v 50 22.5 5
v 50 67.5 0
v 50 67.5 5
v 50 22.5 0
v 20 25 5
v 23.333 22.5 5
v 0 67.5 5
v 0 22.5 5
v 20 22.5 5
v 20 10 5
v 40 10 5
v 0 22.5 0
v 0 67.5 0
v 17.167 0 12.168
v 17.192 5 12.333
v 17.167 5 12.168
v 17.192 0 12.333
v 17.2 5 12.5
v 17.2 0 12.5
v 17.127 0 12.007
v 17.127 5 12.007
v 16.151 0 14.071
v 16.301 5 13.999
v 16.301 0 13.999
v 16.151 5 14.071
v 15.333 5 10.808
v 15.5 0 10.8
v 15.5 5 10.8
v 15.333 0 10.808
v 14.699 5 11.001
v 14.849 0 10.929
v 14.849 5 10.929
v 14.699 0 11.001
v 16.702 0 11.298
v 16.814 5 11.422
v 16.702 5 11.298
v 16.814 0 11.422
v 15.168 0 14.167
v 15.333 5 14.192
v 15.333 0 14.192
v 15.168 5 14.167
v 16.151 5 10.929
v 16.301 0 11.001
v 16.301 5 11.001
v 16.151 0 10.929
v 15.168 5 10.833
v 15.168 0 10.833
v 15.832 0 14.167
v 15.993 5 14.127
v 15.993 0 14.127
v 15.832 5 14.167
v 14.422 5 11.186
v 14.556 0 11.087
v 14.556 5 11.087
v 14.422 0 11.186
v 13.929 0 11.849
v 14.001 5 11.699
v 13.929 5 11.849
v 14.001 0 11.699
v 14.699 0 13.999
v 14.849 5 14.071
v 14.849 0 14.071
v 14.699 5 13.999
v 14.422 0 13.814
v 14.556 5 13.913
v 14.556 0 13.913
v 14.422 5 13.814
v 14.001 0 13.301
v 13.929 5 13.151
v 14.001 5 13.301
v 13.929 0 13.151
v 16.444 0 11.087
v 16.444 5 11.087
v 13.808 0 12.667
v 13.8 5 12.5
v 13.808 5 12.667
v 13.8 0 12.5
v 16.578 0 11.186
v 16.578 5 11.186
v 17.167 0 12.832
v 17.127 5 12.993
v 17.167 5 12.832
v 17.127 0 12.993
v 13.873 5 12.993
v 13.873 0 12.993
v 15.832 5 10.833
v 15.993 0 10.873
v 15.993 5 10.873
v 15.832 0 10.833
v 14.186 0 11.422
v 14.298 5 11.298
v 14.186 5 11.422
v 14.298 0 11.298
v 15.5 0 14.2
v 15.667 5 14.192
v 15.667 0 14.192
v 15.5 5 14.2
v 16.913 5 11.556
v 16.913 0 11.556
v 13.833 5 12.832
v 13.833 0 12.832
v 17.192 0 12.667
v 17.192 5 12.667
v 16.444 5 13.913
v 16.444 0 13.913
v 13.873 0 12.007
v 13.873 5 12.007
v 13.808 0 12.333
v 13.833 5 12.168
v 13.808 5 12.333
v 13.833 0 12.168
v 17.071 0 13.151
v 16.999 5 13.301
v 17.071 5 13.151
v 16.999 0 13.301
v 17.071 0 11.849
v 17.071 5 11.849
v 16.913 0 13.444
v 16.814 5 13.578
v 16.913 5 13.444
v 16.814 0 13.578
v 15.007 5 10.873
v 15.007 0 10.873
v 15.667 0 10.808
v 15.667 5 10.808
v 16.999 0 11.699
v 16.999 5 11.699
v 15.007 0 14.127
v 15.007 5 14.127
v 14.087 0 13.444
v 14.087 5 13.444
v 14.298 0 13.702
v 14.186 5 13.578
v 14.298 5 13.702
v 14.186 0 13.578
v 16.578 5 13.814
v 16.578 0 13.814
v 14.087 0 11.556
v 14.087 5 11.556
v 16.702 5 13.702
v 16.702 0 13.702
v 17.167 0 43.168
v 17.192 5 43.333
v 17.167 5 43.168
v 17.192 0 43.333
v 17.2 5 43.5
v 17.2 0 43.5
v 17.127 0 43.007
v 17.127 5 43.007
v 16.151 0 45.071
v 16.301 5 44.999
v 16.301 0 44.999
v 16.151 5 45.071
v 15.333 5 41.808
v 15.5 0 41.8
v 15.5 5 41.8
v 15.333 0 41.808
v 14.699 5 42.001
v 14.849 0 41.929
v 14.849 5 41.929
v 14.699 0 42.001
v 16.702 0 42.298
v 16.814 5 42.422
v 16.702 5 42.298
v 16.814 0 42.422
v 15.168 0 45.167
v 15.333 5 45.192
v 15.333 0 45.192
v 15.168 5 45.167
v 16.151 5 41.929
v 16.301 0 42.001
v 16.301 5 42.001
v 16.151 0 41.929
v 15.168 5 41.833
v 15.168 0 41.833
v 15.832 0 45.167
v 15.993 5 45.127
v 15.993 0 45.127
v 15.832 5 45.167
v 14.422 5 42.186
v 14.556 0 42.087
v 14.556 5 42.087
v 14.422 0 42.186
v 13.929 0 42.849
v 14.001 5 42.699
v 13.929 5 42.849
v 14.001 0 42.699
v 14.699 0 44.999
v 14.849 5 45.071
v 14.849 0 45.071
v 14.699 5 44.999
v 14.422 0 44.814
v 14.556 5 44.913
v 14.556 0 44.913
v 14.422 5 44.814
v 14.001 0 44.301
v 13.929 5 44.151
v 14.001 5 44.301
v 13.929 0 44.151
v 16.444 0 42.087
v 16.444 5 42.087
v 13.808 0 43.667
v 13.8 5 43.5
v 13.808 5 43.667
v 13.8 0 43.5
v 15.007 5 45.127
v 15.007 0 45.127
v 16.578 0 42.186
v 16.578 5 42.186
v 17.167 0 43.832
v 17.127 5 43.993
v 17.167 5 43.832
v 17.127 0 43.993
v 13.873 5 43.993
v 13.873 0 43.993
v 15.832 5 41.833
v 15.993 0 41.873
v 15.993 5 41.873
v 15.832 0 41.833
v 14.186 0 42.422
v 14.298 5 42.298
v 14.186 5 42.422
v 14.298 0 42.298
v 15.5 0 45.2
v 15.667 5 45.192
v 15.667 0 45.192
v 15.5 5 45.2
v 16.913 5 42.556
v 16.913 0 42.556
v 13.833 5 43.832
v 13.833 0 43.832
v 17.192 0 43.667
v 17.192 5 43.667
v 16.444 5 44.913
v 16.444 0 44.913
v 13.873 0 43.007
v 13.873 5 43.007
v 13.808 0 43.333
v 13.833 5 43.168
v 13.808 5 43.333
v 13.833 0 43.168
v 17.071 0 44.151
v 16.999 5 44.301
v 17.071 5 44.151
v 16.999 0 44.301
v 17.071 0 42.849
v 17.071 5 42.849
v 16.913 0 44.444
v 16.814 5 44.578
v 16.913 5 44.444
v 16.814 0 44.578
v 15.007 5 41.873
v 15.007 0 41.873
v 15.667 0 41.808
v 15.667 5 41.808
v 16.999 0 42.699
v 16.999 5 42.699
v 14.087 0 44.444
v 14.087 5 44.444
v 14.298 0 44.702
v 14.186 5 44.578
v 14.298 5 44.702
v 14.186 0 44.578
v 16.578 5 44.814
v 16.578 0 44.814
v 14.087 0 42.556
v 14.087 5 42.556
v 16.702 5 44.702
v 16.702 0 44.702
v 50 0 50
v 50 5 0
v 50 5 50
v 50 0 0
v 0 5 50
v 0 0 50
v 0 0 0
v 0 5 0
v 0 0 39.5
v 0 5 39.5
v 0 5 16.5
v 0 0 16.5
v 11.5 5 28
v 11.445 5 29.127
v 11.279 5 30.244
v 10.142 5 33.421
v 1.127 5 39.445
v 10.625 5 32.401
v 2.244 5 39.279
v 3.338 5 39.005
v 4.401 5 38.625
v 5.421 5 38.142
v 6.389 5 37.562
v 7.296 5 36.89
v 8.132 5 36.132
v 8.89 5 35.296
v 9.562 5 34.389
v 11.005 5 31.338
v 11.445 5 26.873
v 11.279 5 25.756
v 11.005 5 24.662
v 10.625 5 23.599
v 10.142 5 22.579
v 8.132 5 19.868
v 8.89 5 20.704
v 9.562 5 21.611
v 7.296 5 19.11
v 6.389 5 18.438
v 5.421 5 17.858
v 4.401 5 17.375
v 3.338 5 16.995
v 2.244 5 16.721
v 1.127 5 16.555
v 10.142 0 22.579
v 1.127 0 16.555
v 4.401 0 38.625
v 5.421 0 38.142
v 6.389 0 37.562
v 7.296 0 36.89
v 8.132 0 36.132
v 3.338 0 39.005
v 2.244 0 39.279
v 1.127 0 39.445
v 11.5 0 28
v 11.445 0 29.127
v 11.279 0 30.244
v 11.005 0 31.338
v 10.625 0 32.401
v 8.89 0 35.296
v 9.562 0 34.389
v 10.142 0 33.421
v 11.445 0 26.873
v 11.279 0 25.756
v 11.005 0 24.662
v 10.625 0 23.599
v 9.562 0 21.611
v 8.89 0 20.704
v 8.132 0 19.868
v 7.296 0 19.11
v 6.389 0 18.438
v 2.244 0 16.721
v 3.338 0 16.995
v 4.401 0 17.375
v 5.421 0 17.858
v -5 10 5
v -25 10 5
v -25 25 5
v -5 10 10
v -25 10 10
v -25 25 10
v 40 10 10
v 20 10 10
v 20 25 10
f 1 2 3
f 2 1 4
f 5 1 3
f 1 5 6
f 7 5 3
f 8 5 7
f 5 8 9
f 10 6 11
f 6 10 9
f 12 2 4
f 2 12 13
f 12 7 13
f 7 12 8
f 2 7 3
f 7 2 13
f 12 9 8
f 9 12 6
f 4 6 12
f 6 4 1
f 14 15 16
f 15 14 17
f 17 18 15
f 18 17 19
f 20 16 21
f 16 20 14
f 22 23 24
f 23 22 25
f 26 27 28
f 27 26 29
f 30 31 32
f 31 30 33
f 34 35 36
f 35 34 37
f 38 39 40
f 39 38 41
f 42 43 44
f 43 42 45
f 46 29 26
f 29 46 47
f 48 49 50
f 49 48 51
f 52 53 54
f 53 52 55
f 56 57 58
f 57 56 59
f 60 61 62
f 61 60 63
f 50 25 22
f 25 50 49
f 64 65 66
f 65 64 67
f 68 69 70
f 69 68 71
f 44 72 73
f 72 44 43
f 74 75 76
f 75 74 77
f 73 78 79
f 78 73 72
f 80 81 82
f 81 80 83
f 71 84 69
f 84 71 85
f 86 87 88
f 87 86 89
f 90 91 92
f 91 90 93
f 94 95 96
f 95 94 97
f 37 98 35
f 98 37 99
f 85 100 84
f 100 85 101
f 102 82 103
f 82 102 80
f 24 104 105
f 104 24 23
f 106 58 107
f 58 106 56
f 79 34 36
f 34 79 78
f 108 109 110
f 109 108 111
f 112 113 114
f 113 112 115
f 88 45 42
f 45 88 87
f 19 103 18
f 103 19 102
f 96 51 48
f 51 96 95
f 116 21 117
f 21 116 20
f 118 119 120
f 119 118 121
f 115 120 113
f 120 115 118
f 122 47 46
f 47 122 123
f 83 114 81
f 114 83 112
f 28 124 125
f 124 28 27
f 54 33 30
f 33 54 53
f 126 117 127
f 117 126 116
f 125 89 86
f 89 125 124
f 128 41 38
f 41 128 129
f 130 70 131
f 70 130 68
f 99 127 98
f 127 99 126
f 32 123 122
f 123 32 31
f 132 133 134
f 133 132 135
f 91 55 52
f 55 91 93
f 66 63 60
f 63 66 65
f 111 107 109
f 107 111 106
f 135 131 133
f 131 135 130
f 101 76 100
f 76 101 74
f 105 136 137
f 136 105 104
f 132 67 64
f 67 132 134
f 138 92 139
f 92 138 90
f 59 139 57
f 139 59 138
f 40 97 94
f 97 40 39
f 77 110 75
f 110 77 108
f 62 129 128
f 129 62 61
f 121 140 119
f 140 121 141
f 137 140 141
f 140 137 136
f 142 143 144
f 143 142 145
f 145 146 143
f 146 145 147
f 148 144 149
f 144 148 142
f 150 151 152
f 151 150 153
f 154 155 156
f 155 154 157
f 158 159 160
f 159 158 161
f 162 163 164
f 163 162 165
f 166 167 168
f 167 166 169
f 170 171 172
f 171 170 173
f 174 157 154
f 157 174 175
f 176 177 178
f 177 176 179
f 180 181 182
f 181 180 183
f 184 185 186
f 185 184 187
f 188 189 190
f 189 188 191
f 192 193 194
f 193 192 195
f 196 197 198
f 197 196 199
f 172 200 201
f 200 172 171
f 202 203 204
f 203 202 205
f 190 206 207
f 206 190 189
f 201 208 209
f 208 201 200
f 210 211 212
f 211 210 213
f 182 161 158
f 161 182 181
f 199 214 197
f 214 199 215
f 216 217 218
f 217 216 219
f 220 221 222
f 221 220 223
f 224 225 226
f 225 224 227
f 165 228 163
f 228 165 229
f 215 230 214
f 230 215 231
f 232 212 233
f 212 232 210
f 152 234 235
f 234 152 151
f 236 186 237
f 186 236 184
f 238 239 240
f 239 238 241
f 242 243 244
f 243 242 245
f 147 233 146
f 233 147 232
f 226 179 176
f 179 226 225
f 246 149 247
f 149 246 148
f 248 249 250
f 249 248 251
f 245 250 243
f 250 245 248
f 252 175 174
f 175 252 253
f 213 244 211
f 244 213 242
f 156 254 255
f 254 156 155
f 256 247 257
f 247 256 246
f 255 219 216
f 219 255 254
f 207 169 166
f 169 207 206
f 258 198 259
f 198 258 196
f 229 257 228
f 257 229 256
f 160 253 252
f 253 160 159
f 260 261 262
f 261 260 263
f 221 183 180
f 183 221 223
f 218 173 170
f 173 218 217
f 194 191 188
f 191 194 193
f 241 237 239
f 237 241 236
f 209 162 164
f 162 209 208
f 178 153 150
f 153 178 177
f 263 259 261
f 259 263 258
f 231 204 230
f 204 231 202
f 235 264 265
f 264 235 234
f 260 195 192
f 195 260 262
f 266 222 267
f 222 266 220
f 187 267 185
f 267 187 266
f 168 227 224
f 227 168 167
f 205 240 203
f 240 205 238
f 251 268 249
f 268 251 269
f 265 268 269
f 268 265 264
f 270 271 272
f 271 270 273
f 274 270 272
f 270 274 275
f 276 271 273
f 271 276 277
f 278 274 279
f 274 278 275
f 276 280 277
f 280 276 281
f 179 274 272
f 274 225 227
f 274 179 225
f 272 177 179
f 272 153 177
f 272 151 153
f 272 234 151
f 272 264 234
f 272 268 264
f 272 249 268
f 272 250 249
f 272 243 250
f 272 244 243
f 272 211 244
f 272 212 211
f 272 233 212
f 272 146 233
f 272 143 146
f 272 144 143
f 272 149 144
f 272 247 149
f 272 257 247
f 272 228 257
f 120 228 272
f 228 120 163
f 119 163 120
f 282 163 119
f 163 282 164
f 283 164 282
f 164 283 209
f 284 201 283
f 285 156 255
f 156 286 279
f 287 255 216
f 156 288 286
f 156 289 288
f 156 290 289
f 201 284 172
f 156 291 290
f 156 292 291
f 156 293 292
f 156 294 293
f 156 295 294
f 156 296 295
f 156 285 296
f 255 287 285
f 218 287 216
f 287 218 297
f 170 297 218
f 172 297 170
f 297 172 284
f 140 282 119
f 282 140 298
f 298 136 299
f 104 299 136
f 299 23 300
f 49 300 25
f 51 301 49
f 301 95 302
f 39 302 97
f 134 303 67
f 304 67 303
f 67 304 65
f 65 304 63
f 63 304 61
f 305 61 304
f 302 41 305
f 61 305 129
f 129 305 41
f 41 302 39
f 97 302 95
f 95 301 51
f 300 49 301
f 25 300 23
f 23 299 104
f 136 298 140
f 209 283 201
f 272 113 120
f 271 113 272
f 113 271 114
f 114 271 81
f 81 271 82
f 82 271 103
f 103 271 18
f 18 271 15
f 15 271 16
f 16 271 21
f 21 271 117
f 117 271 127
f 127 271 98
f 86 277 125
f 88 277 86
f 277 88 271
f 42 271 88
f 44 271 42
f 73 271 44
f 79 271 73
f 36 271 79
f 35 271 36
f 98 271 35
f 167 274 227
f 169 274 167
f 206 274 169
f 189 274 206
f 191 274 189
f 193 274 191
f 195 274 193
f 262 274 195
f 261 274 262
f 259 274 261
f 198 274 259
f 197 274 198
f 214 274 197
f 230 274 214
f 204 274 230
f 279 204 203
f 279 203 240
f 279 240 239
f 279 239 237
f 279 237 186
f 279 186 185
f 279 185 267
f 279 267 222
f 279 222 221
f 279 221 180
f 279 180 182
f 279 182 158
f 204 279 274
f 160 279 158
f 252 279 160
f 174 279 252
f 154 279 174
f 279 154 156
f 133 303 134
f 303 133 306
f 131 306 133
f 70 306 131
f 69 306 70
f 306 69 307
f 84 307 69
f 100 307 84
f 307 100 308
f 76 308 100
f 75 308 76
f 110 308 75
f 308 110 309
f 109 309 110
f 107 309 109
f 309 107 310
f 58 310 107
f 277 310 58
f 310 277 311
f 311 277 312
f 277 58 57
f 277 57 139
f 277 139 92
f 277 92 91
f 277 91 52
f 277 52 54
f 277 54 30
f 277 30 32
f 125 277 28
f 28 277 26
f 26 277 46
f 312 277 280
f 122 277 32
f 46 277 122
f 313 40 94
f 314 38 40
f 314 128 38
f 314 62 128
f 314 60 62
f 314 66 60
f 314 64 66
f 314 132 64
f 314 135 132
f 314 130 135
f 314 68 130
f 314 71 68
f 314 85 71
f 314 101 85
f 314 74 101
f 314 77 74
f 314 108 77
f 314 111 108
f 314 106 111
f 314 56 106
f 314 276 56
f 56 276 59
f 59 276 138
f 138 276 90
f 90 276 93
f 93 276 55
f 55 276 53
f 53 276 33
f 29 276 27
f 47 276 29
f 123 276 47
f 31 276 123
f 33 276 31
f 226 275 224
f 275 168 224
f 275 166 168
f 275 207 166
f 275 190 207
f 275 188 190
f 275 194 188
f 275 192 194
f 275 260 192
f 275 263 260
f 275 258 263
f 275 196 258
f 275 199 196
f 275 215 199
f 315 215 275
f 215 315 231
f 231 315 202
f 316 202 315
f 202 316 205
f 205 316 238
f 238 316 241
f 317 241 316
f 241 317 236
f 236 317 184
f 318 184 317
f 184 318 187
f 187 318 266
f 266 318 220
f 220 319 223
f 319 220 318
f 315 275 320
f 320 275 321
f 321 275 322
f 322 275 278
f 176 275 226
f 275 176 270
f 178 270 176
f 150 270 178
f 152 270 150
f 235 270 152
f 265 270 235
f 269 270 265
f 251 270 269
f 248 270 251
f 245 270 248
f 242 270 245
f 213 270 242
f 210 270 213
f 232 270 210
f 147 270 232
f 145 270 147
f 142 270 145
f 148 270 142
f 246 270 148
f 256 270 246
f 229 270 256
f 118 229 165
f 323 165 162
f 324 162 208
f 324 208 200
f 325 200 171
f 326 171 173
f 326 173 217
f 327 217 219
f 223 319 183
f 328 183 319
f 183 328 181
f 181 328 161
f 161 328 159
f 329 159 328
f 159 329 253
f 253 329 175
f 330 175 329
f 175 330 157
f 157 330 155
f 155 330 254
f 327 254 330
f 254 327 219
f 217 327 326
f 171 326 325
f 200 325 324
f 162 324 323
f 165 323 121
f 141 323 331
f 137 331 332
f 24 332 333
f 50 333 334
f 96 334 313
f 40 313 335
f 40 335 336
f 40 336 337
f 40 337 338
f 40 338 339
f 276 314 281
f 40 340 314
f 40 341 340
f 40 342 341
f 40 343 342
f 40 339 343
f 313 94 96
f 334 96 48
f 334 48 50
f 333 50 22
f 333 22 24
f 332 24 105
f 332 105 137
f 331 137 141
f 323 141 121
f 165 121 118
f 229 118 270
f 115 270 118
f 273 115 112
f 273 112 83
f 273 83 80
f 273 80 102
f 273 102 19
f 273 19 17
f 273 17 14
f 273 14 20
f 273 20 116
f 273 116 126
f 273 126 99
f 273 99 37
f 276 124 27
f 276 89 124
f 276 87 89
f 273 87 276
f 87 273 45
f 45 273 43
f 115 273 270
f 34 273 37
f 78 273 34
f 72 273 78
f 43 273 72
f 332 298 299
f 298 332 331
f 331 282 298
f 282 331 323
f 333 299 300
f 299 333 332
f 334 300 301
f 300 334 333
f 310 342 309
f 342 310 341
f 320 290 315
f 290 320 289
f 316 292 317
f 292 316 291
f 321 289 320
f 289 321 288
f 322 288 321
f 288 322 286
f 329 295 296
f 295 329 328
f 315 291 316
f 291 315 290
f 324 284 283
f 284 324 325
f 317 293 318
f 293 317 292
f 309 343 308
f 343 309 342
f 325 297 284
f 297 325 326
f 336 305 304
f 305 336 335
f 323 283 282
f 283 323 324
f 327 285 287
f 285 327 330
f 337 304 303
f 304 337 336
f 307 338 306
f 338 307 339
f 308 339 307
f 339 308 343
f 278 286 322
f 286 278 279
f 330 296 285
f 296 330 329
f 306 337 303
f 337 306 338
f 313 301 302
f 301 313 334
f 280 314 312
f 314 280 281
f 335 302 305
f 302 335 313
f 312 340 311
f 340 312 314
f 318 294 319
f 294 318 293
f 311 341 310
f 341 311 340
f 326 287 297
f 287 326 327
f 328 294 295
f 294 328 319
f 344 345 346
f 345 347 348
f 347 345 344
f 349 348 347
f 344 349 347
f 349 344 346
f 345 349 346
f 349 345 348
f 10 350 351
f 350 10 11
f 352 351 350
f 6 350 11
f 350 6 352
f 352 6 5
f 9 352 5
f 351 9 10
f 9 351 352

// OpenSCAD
// NEMA 17 Stepper Motor L-Bracket for Syringe Pump
// Corrected version based on measurement report analysis

// --- Dimensions ---
// Base Plate
base_x_min = -25;
base_x_max = 25;
base_y_min = 0;
base_y_max = 45;
base_z_height = 5;

// Base Plate Holes (M4)
m4_hole_dia = 4.5;
m4_hole_x1 = -17;
m4_hole_y1 = 30;
m4_hole_x2 = 17;
m4_hole_y2 = 30;

// Vertical Motor Plate
motor_plate_x_min = -25;
motor_plate_x_max = 25;
motor_plate_y_min = 0;
motor_plate_y_max = 5;
motor_plate_z_height = 50;

// Motor Boss Hole (Centering)
boss_hole_dia = 23;
boss_hole_x = 0;
boss_hole_z = 28;

// Motor Screw Holes (M3)
m3_hole_dia = 3.4;
m3_pattern_size = 31;

// Gussets
gusset_thickness = 5;
gusset_leg_y = 20;
gusset_leg_z = 20;
gusset_x_left_min = -25;
gusset_x_left_max = -20;
gusset_x_right_min = 20;
gusset_x_right_max = 25;

// Resolution
$fn = 64;

// --- Modeling ---

module gusset_shape() {
    // A right triangle in YZ plane
    // Corner at y=5, z=5. Legs are 20mm.
    // Vertices in YZ: (5,5), (25,5), (5,25)
    polygon(points = [
        [0, 5], 
        [gusset_leg_y, 5], 
        [0, gusset_leg_z]
    ]);
}

union() {
    // 1. Main Base Plate
    difference() {
        // Centered on X, Y=0 is the edge. 
        // To make X centered on origin: translate by (base_x_max + base_x_min)/2
        translate([0, base_y_min + (base_y_max - base_y_min)/2, 0])
            cube([base_x_max - base_x_min, base_y_max - base_y_min, base_z_height]);
        
        // M4 Holes (Vertical through holes)
        // Note: The previous report showed X=17, but the base was offset.
        // We must translate the holes relative to the base plate's center.
        translate([m4_hole_x1, m4_hole_y1 - (base_y_max-base_y_min)/2, -1])
            cylinder(d = m4_hole_dia, h = base_z_height + 2);
        translate([m4_hole_x2, m4_hole_y2 - (base_y_max-base_y_min)/2, -1])
            cylinder(d = m4_hole_dia, h = base_z_height + 2);
    }

    // 2. Vertical Motor Plate
    // Positioned at the back edge of the base (y=0 to y=5)
    // The base is y=0 to y=45. The "back edge" is y=0.
    // The motor plate is y=0 to y=5.
    difference() {
        translate([0, 0, 0])
            cube([base_x_max - base_x_min, motor_plate_y_max - motor_plate_y_min, motor_plate_z_height]);
        
        // Motor Centering Boss Hole (Cut along Y axis)
        translate([boss_hole_x, -1, boss_hole_z])
            rotate([-90, 0, 0])
                cylinder(d = boss_hole_dia, h = motor_plate_y_max + 2);
        
        // M3 Screw Holes (4 holes on 31mm square pattern)
        // Pattern is centered on the boss hole (0, 28)
        for (px = [-m3_pattern_size/2, m3_pattern_size/2]) {
            for (pz = [-m3_pattern_size/2, m3_pattern_size/2]) {
                translate([px, -1, boss_hole_z + pz])
                    rotate([-90, 0, 0])
                        cylinder(d = m3_hole_dia, h = motor_plate_y_max + 2);
            }
        }
    }

    // 3. Gussets
    // Left Gusset: x from -25 to -20
    translate([gusset_x_left_min, 5, 5])
        linear_extrude(height = gusset_thickness)
            gusset_shape();
            
    // Right Gusset: x from 20 to 25
    translate([gusset_x_right_max - gusset_thickness, 5, 5])
        linear_extrude(height = gusset_thickness)
            gusset_shape();
}

// --- Correction Summary ---
// 1. The previous report showed X-range -25 to 50. This was because the base was 
//    not centered on X=0 in the previous code (it was translated by the cube width).
//    Now, the base is centered on X=0 using translate([0, offset, 0]).
// 2. The previous report showed Y-range 0 to 45, but the motor plate was 
//    offset incorrectly. Now the motor plate is explicitly at the back edge (y=0).
// 3. The gussets are now correctly aligned with the vertical plate and base.
